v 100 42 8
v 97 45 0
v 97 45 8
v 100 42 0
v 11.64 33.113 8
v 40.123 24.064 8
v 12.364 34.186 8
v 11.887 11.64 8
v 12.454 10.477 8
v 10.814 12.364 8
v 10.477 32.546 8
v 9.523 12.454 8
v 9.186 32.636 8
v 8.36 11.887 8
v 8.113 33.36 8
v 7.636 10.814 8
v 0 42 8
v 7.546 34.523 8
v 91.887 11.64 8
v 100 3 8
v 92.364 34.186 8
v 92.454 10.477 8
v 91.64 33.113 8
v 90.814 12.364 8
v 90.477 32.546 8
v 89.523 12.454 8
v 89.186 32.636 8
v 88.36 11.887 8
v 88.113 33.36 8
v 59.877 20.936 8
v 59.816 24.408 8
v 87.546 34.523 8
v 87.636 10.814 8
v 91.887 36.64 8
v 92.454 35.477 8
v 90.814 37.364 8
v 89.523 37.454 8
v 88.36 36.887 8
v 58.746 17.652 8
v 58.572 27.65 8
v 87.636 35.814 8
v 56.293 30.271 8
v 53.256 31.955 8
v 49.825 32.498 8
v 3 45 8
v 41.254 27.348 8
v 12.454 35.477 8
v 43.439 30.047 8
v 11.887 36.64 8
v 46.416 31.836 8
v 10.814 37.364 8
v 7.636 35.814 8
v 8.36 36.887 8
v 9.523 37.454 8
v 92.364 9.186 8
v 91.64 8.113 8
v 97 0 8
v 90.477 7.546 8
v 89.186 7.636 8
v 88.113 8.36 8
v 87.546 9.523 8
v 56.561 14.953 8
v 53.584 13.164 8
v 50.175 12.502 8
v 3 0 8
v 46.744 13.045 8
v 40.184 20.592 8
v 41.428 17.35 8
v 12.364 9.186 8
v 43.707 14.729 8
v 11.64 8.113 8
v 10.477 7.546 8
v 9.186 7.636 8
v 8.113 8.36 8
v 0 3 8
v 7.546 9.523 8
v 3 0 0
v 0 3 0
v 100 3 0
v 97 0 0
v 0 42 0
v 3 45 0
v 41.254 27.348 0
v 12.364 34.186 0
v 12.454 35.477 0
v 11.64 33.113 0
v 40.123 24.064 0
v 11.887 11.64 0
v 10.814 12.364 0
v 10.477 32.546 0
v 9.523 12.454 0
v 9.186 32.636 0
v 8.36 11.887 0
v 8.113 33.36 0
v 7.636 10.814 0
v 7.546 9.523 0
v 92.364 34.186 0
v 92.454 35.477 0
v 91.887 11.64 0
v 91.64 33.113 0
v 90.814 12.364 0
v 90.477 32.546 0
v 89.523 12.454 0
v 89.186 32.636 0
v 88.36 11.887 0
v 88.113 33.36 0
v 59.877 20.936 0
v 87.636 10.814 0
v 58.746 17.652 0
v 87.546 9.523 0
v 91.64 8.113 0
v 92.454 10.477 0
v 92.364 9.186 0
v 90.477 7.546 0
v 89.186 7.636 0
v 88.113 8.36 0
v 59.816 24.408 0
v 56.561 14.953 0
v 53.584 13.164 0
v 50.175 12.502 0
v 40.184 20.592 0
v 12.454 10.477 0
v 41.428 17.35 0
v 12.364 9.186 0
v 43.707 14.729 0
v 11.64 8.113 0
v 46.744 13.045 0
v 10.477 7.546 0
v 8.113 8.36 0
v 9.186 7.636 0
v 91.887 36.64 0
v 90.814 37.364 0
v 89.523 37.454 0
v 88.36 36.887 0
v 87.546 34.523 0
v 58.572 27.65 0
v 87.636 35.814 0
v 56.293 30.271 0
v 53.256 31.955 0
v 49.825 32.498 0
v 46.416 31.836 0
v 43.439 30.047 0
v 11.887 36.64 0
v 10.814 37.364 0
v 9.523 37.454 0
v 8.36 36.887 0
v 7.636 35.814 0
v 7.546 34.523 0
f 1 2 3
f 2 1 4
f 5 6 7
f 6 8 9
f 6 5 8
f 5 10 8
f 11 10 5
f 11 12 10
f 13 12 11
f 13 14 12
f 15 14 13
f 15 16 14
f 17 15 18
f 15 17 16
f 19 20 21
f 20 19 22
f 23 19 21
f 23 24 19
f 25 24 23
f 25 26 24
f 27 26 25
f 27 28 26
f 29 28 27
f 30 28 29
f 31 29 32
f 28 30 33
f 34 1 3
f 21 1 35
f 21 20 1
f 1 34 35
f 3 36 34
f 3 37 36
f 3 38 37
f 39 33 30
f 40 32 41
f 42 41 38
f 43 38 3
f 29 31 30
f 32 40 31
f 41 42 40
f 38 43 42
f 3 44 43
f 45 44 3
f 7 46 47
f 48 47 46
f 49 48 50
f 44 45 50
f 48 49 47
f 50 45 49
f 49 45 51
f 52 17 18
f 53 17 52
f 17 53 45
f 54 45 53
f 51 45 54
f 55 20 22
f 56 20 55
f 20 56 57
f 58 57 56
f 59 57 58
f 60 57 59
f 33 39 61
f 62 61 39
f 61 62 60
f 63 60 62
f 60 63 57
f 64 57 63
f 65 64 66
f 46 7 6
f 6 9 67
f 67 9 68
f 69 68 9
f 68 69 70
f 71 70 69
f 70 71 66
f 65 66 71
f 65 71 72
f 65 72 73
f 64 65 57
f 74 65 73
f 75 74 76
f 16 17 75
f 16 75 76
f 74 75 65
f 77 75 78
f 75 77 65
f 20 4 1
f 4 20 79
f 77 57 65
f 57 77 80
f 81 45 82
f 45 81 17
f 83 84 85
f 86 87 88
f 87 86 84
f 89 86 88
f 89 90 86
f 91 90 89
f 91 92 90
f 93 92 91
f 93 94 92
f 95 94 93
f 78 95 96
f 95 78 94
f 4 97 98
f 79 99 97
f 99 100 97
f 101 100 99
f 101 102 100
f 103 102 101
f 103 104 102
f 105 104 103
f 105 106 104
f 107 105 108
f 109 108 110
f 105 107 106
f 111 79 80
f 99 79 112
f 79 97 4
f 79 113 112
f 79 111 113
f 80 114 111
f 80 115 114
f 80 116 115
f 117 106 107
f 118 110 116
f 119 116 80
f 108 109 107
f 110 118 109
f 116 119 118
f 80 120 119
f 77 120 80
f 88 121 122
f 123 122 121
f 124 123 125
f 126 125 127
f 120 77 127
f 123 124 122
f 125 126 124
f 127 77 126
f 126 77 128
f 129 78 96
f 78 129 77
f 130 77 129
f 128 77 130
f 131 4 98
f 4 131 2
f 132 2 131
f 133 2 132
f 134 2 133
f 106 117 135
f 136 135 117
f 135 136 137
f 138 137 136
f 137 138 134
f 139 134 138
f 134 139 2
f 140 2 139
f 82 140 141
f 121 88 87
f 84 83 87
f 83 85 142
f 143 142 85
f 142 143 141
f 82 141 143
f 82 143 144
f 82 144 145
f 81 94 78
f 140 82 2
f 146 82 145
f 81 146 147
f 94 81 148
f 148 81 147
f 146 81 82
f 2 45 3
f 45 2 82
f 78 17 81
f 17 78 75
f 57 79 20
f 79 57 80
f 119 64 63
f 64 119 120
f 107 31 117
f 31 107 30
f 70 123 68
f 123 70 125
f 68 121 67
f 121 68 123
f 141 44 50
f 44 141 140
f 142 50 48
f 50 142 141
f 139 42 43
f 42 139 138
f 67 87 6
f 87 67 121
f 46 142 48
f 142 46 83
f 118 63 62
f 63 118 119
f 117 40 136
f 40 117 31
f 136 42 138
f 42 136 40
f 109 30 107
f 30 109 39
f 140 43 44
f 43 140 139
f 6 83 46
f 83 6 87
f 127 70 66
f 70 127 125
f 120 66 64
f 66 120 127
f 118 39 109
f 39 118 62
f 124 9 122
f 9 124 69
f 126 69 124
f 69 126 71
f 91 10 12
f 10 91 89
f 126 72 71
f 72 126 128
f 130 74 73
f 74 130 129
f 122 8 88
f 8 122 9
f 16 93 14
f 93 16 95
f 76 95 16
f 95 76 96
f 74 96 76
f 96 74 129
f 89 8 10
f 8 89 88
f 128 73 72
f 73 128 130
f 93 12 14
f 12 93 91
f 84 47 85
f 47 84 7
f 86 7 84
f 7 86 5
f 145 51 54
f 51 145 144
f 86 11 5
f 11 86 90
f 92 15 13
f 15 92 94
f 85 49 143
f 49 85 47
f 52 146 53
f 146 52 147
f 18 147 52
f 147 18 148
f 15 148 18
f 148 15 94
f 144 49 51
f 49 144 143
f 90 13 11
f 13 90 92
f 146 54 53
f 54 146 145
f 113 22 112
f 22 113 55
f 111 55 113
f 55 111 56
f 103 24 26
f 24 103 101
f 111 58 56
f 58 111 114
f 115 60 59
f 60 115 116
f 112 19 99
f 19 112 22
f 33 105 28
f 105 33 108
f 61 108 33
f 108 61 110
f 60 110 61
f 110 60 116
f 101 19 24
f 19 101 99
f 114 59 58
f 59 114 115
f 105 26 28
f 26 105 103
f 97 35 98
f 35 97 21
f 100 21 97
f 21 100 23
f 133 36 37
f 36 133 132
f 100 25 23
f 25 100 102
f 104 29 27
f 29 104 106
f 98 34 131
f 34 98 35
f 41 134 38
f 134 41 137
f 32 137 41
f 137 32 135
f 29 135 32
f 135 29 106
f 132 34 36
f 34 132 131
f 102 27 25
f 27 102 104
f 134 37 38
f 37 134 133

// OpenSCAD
$fn = 32;

// ----------------------------------------------------------------------
// Spacer plate: rect 100 x 45
// ----------------------------------------------------------------------

// --- parameters (mm) ---
bore_r = 10;              // centre bore radius
bolt_r = 2.5;             // bolt hole radius
plate_t = 8;              // plate thickness, Z (extrusion height)
plate_l = 100;            // plate length, X
plate_w = 45;             // plate width, Y
inset = 10;               // corner hole inset

profile = [[3, 0], [97, 0], [100, 3], [100, 42], [97, 45], [3, 45], [0, 42], [0, 3]];  // primary outline, 8 points, counter clockwise
void_1 = [[59.816, 24.408], [58.572, 27.65], [56.293, 30.271], [53.256, 31.955], [49.825, 32.498], [46.416, 31.836], [43.439, 30.047], [41.254, 27.348], [40.123, 24.064], [40.184, 20.592], [41.428, 17.35], [43.707, 14.729], [46.744, 13.045], [50.175, 12.502], [53.584, 13.164], [56.561, 14.953], [58.746, 17.652], [59.877, 20.936]];  // centre bore, 18 points
void_2 = [[12.454, 10.477], [11.887, 11.64], [10.814, 12.364], [9.523, 12.454], [8.36, 11.887], [7.636, 10.814], [7.546, 9.523], [8.113, 8.36], [9.186, 7.636], [10.477, 7.546], [11.64, 8.113], [12.364, 9.186]];  // corner hole, 12 points
void_3 = [[12.454, 35.477], [11.887, 36.64], [10.814, 37.364], [9.523, 37.454], [8.36, 36.887], [7.636, 35.814], [7.546, 34.523], [8.113, 33.36], [9.186, 32.636], [10.477, 32.546], [11.64, 33.113], [12.364, 34.186]];  // corner hole, 12 points
void_4 = [[92.454, 10.477], [91.887, 11.64], [90.814, 12.364], [89.523, 12.454], [88.36, 11.887], [87.636, 10.814], [87.546, 9.523], [88.113, 8.36], [89.186, 7.636], [90.477, 7.546], [91.64, 8.113], [92.364, 9.186]];  // corner hole, 12 points
void_5 = [[92.454, 35.477], [91.887, 36.64], [90.814, 37.364], [89.523, 37.454], [88.36, 36.887], [87.636, 35.814], [87.546, 34.523], [88.113, 33.36], [89.186, 32.636], [90.477, 32.546], [91.64, 33.113], [92.364, 34.186]];  // corner hole, 12 points

// --- the one profile operation ---
difference() {
  linear_extrude(height = plate_t) polygon(points = profile);
  translate([0, 0, -1])
    linear_extrude(height = plate_t + 2) polygon(points = void_1);
  translate([0, 0, -1])
    linear_extrude(height = plate_t + 2) polygon(points = void_2);
  translate([0, 0, -1])
    linear_extrude(height = plate_t + 2) polygon(points = void_3);
  translate([0, 0, -1])
    linear_extrude(height = plate_t + 2) polygon(points = void_4);
  translate([0, 0, -1])
    linear_extrude(height = plate_t + 2) polygon(points = void_5);
}
